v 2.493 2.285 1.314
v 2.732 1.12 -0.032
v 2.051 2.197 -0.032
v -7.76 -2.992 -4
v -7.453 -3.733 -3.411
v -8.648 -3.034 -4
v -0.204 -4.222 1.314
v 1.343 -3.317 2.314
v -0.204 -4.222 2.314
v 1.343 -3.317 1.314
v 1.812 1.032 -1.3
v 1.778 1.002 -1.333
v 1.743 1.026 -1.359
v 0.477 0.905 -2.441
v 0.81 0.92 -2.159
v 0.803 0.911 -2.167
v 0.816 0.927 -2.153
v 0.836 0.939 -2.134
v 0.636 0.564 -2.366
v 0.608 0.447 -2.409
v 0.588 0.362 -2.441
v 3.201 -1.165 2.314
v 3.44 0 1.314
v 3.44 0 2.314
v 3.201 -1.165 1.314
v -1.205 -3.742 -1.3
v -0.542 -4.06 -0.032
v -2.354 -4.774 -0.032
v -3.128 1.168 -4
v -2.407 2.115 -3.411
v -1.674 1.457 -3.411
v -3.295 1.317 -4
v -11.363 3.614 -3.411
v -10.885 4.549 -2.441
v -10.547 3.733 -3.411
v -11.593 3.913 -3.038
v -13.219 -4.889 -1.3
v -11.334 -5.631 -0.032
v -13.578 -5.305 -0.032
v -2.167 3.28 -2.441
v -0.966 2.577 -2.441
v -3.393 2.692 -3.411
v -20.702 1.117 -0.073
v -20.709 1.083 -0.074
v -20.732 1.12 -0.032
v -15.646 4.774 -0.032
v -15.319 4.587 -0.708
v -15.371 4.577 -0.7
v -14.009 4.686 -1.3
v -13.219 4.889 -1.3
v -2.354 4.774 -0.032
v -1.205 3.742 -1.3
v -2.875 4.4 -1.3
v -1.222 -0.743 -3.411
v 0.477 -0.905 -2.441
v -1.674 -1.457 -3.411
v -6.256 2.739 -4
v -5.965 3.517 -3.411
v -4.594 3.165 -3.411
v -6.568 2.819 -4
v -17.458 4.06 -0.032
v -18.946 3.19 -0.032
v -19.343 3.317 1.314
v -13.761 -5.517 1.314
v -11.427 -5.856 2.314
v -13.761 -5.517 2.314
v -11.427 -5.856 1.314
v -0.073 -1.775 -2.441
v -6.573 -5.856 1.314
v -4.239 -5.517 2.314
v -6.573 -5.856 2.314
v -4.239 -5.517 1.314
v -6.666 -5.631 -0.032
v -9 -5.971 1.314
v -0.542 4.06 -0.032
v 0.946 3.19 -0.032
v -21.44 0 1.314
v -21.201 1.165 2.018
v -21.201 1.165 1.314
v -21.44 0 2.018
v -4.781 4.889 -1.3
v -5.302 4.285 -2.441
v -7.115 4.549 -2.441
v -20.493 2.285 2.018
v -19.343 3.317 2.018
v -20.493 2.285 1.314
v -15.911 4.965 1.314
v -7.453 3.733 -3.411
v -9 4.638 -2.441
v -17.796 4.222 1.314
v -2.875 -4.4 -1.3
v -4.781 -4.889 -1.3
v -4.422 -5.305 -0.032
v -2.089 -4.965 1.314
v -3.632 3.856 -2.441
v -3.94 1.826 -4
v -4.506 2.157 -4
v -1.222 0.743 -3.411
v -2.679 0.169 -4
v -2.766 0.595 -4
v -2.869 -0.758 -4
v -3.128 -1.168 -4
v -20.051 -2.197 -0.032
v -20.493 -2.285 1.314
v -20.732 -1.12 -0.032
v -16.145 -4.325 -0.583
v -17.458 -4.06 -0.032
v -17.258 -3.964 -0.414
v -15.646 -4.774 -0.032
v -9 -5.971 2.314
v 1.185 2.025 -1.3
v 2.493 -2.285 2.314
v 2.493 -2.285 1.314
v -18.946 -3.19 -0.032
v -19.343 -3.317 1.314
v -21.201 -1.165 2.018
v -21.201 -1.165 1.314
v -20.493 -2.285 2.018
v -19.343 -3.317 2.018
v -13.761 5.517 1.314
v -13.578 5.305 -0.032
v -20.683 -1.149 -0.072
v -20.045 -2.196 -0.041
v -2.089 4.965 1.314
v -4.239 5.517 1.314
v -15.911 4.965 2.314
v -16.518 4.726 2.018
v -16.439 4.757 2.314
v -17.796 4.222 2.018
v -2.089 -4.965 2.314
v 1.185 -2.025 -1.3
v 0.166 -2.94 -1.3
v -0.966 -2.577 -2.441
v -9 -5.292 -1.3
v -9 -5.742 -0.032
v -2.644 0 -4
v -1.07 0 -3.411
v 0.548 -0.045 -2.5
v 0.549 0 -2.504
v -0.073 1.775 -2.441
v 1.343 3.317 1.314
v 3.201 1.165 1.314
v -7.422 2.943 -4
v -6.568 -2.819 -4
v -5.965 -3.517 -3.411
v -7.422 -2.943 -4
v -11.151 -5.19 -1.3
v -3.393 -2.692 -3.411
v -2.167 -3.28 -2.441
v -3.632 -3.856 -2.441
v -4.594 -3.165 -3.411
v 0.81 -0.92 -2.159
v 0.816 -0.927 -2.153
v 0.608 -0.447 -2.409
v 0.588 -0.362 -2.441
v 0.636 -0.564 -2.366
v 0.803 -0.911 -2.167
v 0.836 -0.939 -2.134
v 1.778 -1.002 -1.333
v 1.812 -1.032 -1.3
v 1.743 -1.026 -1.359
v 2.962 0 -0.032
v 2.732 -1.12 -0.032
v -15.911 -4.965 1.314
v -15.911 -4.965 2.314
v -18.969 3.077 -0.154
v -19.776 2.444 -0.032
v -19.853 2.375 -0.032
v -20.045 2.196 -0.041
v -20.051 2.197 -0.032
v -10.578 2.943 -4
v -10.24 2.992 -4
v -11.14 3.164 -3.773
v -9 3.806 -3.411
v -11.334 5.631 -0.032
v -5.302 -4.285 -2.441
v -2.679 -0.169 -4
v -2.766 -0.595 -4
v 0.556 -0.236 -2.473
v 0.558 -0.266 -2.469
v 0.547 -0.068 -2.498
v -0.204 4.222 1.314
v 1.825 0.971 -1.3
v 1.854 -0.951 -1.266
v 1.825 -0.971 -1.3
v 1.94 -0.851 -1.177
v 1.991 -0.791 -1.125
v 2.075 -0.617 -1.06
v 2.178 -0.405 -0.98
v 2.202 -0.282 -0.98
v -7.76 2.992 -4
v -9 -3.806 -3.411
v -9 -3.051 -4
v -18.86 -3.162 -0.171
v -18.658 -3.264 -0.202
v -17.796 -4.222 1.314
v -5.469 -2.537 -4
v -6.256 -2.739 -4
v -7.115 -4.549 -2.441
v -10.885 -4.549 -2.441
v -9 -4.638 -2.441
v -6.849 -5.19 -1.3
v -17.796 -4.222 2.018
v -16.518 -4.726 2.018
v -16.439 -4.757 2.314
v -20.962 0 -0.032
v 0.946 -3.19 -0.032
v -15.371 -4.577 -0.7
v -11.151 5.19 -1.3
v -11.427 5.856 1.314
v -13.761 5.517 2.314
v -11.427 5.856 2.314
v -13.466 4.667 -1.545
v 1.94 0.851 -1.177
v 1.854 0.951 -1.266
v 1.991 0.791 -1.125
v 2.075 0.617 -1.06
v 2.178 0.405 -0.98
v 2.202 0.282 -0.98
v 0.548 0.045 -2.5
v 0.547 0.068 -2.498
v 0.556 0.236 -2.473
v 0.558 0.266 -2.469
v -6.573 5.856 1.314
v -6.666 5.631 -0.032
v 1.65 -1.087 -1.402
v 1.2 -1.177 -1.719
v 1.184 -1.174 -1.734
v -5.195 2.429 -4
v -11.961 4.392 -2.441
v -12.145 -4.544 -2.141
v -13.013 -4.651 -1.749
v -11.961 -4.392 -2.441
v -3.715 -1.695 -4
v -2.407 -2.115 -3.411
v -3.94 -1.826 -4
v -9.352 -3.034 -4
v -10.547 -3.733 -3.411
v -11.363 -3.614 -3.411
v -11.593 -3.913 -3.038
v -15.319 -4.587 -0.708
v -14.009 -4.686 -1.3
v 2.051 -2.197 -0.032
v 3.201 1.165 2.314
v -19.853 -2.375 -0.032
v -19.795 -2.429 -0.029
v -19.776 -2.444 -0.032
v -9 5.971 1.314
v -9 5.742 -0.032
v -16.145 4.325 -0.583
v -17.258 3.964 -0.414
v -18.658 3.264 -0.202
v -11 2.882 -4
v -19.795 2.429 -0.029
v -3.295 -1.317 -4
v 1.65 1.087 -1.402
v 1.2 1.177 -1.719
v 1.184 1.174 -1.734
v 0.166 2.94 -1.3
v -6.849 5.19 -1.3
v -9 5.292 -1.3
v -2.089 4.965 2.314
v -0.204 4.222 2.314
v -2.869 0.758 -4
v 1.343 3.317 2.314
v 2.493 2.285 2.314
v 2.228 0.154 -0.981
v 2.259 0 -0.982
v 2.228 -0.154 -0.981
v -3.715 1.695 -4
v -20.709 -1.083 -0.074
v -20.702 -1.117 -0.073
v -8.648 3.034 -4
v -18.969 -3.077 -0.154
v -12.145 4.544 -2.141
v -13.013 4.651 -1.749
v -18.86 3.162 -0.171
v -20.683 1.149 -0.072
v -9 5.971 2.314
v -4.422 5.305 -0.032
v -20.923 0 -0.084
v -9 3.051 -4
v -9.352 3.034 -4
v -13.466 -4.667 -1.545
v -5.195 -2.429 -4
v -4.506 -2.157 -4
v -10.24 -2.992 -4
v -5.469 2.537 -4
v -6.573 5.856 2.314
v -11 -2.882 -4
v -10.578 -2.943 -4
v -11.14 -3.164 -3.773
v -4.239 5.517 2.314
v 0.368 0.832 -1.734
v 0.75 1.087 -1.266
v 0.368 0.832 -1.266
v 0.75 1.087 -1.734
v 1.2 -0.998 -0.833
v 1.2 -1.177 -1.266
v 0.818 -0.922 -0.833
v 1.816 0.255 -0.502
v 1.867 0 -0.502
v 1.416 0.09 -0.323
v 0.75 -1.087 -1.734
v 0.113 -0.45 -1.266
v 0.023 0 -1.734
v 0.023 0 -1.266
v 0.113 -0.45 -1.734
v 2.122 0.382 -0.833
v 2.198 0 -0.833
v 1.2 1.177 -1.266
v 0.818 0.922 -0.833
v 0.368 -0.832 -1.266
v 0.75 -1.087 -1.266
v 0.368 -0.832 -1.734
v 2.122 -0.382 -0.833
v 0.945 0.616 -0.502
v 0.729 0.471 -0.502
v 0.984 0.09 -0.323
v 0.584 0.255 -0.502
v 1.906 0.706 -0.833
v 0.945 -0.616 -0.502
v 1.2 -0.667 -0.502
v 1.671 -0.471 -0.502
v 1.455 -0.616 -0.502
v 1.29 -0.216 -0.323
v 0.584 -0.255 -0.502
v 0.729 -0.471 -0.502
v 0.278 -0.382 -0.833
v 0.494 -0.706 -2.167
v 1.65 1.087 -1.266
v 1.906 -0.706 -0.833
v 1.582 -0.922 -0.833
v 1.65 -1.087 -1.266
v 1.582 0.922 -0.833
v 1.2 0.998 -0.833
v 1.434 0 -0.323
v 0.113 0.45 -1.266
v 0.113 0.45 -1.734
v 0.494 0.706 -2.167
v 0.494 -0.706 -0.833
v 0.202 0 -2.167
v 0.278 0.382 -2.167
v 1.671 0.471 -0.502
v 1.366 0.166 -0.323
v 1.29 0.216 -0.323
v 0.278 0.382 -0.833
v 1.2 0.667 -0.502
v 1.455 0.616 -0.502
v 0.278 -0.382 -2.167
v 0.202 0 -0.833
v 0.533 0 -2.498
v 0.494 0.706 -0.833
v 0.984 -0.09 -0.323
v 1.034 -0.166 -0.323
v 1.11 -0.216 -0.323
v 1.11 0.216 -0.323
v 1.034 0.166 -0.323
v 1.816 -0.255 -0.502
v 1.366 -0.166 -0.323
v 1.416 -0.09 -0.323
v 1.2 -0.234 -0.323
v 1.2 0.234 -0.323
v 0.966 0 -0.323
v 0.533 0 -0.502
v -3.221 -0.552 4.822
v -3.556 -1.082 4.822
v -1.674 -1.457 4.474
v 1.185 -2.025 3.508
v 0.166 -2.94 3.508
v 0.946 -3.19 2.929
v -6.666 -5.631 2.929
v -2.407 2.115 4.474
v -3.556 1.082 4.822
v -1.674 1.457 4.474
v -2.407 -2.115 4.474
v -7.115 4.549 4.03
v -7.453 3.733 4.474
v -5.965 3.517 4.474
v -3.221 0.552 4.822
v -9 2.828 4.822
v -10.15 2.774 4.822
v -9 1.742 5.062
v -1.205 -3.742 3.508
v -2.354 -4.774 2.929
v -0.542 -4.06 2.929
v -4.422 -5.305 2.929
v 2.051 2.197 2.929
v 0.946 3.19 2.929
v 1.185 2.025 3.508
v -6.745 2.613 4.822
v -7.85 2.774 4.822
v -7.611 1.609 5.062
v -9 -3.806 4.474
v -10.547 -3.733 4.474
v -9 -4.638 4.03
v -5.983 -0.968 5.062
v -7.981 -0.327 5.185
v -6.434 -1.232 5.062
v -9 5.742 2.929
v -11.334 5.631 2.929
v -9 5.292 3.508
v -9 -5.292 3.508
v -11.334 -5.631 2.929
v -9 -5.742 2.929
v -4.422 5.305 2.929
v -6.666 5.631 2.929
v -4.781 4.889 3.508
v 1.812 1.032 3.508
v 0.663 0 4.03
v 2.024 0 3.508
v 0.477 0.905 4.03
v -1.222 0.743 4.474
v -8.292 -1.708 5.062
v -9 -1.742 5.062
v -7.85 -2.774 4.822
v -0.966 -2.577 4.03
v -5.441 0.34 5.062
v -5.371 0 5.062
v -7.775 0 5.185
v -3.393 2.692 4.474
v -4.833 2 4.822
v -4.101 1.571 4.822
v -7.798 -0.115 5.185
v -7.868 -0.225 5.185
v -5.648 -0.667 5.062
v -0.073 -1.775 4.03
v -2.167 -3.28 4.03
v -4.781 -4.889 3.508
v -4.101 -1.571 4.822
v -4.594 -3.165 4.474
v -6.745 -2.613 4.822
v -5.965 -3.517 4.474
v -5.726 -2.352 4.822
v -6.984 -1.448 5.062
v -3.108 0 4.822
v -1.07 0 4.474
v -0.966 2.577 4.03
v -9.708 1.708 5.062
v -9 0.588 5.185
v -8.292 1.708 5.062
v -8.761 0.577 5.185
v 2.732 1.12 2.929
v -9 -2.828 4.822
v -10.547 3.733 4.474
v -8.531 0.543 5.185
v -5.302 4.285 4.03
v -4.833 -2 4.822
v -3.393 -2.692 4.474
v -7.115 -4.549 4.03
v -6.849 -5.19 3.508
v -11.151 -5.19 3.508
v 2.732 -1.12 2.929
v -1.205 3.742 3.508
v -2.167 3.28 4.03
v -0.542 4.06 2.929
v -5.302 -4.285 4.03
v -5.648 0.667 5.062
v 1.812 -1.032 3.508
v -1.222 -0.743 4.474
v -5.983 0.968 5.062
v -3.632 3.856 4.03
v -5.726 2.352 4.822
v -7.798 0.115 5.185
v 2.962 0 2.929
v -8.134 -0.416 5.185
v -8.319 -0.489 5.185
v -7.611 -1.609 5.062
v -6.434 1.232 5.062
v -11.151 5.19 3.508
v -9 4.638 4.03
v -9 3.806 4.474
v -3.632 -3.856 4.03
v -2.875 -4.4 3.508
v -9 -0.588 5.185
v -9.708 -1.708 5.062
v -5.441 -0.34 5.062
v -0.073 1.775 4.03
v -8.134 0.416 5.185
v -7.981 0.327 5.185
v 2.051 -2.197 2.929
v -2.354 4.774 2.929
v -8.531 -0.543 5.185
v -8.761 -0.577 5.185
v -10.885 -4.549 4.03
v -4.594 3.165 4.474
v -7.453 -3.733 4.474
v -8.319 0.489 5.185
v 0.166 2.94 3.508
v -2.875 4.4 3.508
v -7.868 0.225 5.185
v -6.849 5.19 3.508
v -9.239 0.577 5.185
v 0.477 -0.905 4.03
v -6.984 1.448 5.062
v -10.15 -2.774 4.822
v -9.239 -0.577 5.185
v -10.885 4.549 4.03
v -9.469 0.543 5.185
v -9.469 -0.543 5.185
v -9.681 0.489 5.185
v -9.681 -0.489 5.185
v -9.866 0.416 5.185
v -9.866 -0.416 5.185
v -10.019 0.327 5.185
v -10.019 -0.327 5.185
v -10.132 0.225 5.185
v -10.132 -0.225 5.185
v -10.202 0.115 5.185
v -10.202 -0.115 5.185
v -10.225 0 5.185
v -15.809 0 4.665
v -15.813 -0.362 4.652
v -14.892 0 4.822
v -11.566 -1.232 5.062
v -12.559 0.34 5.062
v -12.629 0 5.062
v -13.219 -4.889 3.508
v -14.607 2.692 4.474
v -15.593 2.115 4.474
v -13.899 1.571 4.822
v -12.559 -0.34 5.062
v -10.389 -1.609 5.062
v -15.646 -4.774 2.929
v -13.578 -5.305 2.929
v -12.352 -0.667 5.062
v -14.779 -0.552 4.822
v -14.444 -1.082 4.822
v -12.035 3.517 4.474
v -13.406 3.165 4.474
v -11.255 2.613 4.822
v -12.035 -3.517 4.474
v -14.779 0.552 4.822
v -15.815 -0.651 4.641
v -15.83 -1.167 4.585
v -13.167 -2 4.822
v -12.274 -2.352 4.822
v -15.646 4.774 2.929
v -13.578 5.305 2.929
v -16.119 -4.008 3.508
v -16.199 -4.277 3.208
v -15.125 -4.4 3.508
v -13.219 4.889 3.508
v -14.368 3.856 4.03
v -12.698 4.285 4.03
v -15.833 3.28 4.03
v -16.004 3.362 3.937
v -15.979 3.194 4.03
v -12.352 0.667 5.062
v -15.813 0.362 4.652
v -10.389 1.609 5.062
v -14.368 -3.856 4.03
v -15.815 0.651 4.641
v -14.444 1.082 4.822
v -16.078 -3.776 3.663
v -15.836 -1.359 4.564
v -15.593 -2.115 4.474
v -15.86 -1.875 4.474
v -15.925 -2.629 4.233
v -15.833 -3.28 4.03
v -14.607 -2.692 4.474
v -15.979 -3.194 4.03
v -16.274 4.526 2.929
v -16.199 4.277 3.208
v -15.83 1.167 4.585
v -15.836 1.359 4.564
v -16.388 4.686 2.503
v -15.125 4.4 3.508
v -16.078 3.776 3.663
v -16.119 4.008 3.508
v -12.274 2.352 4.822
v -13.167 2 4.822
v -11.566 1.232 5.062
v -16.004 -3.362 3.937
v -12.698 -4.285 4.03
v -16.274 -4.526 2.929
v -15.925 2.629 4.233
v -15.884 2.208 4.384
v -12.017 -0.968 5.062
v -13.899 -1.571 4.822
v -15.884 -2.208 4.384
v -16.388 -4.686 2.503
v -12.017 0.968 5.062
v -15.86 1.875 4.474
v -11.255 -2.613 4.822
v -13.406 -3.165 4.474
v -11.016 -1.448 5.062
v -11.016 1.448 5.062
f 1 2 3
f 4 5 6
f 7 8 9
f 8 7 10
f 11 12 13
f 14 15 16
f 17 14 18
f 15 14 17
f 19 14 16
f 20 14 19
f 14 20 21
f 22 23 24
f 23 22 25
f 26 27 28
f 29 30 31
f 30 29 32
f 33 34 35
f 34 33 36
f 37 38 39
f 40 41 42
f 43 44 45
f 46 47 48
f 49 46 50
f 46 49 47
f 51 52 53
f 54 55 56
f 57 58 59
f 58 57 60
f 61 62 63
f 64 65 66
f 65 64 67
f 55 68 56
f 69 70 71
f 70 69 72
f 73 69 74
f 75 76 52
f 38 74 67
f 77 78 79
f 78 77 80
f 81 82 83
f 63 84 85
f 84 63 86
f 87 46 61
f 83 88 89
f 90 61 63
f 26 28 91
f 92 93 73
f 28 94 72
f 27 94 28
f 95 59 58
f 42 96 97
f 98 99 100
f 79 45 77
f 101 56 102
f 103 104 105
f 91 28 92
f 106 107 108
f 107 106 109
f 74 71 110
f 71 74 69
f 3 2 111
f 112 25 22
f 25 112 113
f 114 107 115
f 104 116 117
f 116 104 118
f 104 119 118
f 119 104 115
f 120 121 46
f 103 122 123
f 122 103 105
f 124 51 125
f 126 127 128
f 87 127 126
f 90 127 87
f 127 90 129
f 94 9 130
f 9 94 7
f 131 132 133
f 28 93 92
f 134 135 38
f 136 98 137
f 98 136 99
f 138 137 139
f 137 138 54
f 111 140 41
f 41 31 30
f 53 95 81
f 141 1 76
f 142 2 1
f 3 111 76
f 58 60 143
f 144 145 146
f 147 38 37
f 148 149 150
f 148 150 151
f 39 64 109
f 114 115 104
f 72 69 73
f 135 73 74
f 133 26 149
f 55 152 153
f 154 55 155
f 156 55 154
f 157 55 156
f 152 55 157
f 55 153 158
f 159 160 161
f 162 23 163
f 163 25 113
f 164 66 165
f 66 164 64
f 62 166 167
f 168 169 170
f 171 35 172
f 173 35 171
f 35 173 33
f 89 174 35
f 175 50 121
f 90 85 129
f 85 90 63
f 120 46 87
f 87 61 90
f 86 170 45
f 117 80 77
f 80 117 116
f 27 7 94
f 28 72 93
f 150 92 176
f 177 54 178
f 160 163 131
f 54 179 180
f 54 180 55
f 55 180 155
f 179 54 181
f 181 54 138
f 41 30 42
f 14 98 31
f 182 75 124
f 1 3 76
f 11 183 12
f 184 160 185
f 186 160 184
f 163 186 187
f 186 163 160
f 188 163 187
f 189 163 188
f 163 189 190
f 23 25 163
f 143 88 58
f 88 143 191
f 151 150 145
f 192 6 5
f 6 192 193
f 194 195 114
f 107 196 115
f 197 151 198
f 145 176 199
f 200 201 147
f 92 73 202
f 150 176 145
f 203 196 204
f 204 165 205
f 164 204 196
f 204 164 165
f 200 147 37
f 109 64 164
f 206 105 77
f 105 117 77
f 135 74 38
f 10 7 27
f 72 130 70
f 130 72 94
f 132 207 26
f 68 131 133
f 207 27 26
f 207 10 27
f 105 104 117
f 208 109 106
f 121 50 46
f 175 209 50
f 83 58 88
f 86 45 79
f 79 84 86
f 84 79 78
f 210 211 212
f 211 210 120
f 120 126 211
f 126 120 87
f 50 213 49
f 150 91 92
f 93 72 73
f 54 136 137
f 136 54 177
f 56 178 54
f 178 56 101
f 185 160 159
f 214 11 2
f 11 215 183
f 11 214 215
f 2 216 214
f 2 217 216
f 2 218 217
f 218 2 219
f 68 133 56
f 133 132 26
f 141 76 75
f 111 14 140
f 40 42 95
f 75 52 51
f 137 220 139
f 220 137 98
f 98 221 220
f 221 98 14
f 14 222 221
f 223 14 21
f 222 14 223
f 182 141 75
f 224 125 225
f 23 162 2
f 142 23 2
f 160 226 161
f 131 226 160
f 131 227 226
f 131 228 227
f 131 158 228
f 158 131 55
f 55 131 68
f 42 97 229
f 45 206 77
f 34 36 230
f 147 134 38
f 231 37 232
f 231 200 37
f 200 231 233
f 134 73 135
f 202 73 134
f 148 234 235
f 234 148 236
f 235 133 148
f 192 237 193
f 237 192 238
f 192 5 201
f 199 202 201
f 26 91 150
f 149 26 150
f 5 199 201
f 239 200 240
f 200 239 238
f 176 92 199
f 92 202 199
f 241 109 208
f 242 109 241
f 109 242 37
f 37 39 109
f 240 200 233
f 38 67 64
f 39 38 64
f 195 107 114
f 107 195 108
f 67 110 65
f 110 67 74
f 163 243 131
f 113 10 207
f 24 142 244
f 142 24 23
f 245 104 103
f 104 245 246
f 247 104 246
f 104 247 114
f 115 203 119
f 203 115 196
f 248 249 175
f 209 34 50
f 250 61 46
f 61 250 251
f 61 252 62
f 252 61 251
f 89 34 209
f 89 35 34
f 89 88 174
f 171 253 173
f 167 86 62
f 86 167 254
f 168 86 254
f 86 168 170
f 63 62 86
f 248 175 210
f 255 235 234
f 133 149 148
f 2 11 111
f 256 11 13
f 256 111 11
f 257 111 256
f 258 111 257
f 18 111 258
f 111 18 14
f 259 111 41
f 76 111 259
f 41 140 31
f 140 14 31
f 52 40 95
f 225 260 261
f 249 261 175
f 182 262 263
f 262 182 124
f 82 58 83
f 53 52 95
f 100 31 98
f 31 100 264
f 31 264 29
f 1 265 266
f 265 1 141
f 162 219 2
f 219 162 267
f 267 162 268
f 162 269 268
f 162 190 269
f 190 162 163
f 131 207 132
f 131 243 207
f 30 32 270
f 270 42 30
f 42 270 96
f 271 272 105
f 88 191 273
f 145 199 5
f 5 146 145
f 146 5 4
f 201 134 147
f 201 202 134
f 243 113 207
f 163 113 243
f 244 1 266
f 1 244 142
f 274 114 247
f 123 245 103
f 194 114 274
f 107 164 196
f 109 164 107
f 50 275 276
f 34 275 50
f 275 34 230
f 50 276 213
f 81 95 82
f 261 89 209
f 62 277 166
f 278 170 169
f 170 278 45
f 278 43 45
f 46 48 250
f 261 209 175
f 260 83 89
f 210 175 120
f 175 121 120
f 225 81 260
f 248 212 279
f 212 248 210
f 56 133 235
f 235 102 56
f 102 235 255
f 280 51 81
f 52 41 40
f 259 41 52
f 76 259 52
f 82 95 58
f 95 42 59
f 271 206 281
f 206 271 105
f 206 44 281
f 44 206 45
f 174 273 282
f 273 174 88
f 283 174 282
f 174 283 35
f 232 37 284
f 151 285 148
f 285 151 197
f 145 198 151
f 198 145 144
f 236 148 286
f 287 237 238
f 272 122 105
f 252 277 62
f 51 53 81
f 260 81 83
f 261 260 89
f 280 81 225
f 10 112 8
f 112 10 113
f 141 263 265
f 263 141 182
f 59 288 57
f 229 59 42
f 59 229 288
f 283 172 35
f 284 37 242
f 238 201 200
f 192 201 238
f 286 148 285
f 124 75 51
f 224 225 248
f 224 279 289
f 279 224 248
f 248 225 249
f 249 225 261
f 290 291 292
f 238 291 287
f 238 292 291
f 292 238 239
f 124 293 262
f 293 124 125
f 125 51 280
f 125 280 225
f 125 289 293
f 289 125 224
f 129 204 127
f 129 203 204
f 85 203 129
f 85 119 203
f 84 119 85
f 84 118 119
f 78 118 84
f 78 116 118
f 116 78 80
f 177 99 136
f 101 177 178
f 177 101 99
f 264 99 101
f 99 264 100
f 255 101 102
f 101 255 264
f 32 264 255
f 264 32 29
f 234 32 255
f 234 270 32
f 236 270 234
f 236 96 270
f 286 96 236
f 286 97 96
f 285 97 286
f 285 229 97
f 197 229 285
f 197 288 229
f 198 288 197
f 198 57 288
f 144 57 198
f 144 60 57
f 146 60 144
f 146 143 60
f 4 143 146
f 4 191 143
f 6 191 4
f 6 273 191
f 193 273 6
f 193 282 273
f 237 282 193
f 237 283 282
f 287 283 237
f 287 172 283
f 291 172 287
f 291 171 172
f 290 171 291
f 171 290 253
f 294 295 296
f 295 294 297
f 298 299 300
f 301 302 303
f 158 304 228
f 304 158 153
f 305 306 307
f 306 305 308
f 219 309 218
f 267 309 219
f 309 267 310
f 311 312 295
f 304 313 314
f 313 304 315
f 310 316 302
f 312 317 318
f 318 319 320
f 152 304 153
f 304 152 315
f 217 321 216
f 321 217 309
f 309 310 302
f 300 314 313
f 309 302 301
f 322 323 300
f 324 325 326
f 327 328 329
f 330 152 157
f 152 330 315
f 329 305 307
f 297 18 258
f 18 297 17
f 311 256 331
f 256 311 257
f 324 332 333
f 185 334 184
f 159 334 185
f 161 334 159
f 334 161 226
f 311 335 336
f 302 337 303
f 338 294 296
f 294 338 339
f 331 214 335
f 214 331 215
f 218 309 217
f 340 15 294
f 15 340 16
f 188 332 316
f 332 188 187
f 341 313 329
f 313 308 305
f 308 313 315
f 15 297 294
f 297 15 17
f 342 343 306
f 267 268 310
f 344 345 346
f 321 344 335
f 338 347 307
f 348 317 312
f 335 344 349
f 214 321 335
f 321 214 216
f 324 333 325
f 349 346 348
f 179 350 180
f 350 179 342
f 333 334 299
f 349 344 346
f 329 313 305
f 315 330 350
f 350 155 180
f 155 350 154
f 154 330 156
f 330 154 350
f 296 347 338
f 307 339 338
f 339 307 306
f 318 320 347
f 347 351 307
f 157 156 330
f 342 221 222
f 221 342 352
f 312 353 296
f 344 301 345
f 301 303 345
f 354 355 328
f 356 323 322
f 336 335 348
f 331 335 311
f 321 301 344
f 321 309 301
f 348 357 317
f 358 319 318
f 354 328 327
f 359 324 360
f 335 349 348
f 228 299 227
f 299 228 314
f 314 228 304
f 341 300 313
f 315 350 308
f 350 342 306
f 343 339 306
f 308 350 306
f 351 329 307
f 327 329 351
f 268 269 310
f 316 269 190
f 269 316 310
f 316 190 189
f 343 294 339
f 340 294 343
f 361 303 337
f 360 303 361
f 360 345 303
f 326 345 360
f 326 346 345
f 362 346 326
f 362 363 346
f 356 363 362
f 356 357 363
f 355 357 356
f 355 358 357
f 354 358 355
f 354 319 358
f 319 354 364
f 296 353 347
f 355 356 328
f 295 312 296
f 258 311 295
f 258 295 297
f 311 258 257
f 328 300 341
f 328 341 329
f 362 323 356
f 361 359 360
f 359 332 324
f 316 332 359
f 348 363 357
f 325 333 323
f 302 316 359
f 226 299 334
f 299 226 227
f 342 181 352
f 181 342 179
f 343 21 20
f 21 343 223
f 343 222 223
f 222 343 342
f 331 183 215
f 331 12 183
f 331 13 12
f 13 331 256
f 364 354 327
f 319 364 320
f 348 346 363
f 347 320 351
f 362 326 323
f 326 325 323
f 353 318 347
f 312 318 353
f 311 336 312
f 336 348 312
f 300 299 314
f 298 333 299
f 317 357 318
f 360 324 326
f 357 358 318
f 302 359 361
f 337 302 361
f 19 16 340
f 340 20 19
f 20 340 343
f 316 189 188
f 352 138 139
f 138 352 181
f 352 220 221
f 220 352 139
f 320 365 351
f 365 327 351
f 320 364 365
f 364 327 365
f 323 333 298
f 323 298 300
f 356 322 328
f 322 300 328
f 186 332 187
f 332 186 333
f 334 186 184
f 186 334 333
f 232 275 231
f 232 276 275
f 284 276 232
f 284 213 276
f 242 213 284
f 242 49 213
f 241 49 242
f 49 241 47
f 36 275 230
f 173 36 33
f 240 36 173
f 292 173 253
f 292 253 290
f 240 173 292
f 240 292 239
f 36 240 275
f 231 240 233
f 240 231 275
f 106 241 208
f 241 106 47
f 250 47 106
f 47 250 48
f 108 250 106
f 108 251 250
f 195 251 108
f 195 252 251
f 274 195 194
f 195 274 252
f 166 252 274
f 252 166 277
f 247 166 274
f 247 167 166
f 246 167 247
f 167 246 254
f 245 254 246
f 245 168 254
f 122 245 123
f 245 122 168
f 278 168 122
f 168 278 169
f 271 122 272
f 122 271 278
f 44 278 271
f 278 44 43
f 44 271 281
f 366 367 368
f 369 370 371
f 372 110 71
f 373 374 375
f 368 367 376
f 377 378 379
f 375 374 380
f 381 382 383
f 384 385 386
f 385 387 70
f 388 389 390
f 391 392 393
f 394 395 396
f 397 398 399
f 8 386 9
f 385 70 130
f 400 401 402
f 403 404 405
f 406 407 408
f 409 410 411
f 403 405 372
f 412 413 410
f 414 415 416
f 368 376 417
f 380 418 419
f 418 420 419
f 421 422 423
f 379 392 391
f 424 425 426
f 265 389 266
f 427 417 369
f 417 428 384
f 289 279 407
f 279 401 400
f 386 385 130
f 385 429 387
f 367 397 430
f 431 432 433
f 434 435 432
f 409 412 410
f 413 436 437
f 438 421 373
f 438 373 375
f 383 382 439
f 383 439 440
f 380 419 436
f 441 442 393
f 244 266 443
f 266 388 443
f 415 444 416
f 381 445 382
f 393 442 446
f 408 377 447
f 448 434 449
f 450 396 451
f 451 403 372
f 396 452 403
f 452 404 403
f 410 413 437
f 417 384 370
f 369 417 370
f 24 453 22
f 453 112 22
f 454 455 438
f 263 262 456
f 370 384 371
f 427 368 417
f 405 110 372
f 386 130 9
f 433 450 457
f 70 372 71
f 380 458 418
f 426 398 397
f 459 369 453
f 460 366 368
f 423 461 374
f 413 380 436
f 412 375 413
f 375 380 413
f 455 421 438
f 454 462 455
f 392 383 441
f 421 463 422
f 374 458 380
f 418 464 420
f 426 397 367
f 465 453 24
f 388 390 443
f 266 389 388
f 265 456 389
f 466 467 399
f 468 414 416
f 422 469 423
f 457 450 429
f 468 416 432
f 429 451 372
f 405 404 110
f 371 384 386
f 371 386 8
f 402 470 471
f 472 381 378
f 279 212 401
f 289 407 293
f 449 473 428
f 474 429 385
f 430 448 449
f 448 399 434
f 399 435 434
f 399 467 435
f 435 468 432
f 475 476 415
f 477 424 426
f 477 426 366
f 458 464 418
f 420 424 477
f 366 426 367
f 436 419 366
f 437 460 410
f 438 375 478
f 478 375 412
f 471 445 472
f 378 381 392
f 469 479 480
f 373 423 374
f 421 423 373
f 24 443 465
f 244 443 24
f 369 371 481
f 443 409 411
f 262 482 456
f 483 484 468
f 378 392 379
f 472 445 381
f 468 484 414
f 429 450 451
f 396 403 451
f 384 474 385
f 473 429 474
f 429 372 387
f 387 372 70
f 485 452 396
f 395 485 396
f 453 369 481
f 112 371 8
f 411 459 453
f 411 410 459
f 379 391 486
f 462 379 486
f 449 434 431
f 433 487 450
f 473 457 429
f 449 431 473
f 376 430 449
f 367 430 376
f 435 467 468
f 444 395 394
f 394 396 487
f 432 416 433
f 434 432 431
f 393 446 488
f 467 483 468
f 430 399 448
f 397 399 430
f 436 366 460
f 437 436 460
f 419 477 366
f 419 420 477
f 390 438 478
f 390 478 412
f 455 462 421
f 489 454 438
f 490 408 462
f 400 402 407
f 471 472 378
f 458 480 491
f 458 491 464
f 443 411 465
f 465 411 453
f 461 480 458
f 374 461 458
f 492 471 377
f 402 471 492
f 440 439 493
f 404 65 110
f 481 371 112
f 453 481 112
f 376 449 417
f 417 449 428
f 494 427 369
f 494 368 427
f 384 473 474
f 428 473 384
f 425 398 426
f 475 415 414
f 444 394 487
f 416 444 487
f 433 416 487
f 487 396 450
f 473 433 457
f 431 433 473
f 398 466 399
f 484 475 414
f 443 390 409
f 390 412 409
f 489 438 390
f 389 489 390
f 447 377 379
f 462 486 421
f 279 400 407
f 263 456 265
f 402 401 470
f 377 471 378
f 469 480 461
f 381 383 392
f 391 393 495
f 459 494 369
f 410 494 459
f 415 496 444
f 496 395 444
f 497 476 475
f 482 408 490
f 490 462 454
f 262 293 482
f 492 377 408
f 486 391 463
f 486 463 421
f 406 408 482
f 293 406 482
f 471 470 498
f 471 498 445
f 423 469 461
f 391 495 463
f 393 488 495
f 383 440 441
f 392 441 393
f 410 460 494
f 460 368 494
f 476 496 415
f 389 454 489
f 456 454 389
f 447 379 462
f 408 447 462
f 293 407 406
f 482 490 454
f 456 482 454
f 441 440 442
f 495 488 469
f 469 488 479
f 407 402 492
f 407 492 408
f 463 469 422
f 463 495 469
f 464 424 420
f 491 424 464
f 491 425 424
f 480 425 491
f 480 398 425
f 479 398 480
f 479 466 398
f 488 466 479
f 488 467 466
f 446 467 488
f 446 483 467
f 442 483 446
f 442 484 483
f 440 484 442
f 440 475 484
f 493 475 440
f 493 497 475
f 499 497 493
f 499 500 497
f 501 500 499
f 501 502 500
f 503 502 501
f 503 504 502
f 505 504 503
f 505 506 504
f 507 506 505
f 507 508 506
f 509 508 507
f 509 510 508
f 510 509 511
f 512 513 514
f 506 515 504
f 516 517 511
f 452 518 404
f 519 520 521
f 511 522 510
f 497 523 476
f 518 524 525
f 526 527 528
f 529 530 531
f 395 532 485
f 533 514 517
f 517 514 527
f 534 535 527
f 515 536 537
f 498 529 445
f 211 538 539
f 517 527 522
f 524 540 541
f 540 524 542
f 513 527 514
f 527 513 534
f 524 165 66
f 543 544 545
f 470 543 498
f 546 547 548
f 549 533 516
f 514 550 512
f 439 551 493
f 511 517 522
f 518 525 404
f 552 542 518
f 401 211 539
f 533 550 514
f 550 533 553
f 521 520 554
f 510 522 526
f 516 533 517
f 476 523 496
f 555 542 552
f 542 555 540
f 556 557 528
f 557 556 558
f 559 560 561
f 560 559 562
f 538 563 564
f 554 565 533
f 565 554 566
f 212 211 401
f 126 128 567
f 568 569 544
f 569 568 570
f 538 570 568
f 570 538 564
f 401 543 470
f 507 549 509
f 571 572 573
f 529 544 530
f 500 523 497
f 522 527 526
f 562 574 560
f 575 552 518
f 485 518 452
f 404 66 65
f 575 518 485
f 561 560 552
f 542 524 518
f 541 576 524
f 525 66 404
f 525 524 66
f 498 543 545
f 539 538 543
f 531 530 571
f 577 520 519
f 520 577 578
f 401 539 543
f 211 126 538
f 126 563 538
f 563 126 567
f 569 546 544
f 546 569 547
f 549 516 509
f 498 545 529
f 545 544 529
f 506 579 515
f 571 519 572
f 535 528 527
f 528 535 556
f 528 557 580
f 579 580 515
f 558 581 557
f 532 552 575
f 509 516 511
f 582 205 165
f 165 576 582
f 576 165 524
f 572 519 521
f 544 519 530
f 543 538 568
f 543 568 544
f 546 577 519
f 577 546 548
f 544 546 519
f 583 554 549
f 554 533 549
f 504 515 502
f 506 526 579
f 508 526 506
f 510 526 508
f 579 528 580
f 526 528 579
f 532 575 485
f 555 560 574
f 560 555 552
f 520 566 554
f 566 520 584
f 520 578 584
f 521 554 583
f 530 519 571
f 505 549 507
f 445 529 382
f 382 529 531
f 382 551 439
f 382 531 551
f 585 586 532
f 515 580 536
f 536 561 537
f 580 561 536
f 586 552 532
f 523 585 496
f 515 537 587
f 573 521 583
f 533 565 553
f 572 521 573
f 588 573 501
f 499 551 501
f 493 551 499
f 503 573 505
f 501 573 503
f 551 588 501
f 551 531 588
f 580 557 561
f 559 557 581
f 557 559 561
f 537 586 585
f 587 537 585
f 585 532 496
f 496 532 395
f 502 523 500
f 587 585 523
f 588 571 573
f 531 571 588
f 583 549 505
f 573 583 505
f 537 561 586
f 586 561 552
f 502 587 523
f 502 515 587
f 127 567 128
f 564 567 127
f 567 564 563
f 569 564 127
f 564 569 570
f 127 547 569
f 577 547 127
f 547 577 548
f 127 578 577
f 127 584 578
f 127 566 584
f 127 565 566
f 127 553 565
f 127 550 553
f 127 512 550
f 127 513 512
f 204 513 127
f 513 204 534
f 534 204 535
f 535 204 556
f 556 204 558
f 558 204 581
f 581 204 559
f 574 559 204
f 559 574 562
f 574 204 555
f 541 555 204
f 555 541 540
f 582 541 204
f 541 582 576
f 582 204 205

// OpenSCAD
// file: ../lib/util.scad
fn1 = 32;
fn2 = 16;

module util_half_sphere(radius, fn=fn1) {
    difference() {
        sphere(radius, $fn=fn);
        translate([0,0,-(radius+radius/19)])
            cube(2*radius+radius/10, center=true);
    }
}

function gcd(a,b) = a == b ? a : a > b ? gcd(a-b, b) : gcd(a, b-a);

module util_saucer(length, width, height, fn=fn1) {
    rad = gcd(length,gcd(width,height));
    //rad = 10;
    scale([length/(2*rad), width/(2*rad), height/rad])
        util_half_sphere(rad, fn);
}

module util_half_cylinder(length, radius, inner_fn=fn2, outer_fn=fn1) {
    maxval = max(length, 2*radius);
    intersection() {
        difference() {
            rotate([0,90,0])
                translate([0,0,-(length/2 + length/20)])
                    cylinder(length+length/10, radius, radius, $fn=inner_fn);
            
            translate([0,0,(maxval/2 + maxval/19)])
                cube(maxval+maxval/10, center=true);
        }
        
        translate([0,0,-(radius+radius/20)])
            cylinder(radius + radius/10, length/2, length/2, $fn=outer_fn);
    }
}

module util_body(length, width, height, upper_height, fn=fn1) {
    rad = gcd(length, gcd(width, upper_height));
    
    scale(.995) scale([length/(2*rad), width/(2*rad), 1])
        util_half_cylinder(2*rad, height, outer_fn=fn);
}

module util_graded_cylinder(height, radius_start, radius_end, grades=1, fn=fn1) {
    height_grade = height / grades;
    radius_grade = (radius_start - radius_end) / (grades * grades);
    for (i = [0 : 1 : grades]) {
        translate([0,0,i*height_grade])
            cylinder(height_grade, 
                     radius_start - i*radius_grade * i,
                     radius_start - (i+1) * radius_grade * (i+1),
                     $fn = fn);
    }
}

module util_nacelle(length, width, height, curved=false, up=true, front_bulge=false) {
    rad = min(width, height/2);
    grads = curved ? 6 : 1;
    scale_factor = front_bulge ? 1.1 : 1;
    direction = up ? -1 : 1;
    difference() {
        scale([1, width/ (2*rad), height/rad])
            difference() {
                union() {
                    rotate([0,-90,0])
                        rotate(30)
                            util_graded_cylinder(length-rad, rad, rad/2, grads, 6);
                    scale(scale_factor) 
                        rotate([0,90,0]) rotate(90) sphere(rad, $fn=6);
                }
                
                translate([-length/2, 0, direction * (height/2 + height/19)])
                    cube([length+length, width+width, height+height/10], center=true);
            }
        
        translate([-length-(curved?length/3:0), 0, -length/3])
            rotate([0,-45,0])
                cube(length, center=true);
    }
}

module util_mirrored(v) {
    children();
    mirror(v) children();
}

module util_ring(outer, inner, height) {
    difference() {
        translate([0,0,-height/2])
            cylinder(height, outer, outer);
        translate([0,0,-(height/2 + height/19)])
            cylinder(height+height/10, inner, inner);
    }
}

module util_star(radius, thick, num, half=false) {
    angle = 360/num;
    offset = half? angle/2 : 0;
    for (i = [0: 1: num]) {
        rotate(i* angle + offset)
            translate([radius/2,0,0])
                cube([radius, thick, thick], center=true);
    }
}

module util_ring_star(radius, thick, num, inner, half=false) {
    outer=inner+thick;
    avg = (inner + outer)/2;
    union() {
        difference() {
            util_star(radius, thick, num, half);
            cylinder(2*thick, outer, outer, $fn=num, center=true);
        }
        util_ring(outer, inner, thick);
    }
}

module util_hangar_disk(height, lower, upper, num, fn=fn1) {
    difference() {
            cylinder(height, lower, upper, $fn=fn, center=true);
        difference() {
            scale([1,1,22])
                util_star(1.1*upper, height/20, num, half=true);
            scale(.95)
                cylinder(height, lower, upper, $fn=fn, center=true);
        }
    }
}

module util_hangar_form(length, width, height, num, inner=0) {
    l = 0.6* max(length, width);
    h = 2.5* height;
    thick = min(height/20,1);
    inner = inner == 0 ? l/3 : inner;
    difference() {
        children();
        scale([1,1,h/thick]) 
            util_ring_star(l, thick, num, inner, half=true);
    }
    scale(.95) children();
}

module util_nacelle_bar(span, height, width, thickness) {
    rad = (span*span/(8*height) + height/2);
    outer = rad + thickness/2;
    inner = rad - thickness/2;
    difference(){
        translate([0,0,outer])
            rotate([0,90,0])
                util_ring(outer, inner, width);
    
        translate([0,0,1.1*outer+height])
            cube(2.2*outer, center=true);
    }
}

module util_q_sphere(rad, quadrant, faces) {
    x_sign = quadrant == 1 ? 1 :
             quadrant == 2 ? -1 :
             quadrant == 3 ? -1 :
             quadrant == 4 ? 1 : 0;
    z_sign = quadrant == 1 ? 1 :
             quadrant == 2 ? 1 :
             quadrant == 3 ? -1 :
             quadrant == 4 ? -1 : 0;
    
    difference() {
        sphere(rad, $fn=faces);

        translate([x_sign*(-1.1*rad - .01),0,0])
        cube(2.2*rad, center=true);

        translate([0,0,z_sign*(-1.1*rad - .01)])
        cube(2.2*rad, center=true);
    }
}

module util_ovoid(front_rad, back_rad, width, upper_rad, lower_rad, faces=32) {
    half_width = width/2;
    largest=max(front_rad, back_rad, half_width, upper_rad, lower_rad);
    smallest=min(front_rad, back_rad, half_width, upper_rad, lower_rad);
    
    union() {
        scale([front_rad/smallest, half_width/smallest, upper_rad/smallest])
        util_q_sphere(smallest, 1, faces);
        
        scale([front_rad/smallest, half_width/smallest, lower_rad/smallest])
        util_q_sphere(smallest, 4, faces);
        
        scale([back_rad/smallest, half_width/smallest, lower_rad/smallest])
        util_q_sphere(smallest, 3, faces);
        
        scale([back_rad/smallest, half_width/smallest, upper_rad/smallest])
        util_q_sphere(smallest, 2, faces);
    }
}
// main file
use <../lib/util.scad>;

module dip_saucer() {
    difference() {
        util_saucer(27,27,5);
        //dip_body();
        translate([13.5,0,2]) 
            rotate([0,-15,0])
            cube(5, center=true);
    }
    
}

module dip_body() {
    difference() {
        translate([-9,0,2])
            mirror([0,0,1])
                util_saucer(25,12,7);
        
        union() {
            translate([-9,0,-13])
                cube(18, center=true);
            
            translate([1.2,0,-1.5])
                sphere(1.2, $fn=16);
            
            translate([-21,0,-4])
                scale([2.5,1,1])
                rotate([90,0,0])
                    cylinder(12,4,4, center=true);
        }
    }
    
    difference() {
        translate([-9,0,2])
        util_ovoid(12.5,12.5,12,3.2,1);
        
        translate([-30,0,0])
        rotate([0,15,0])
        cube(25,center=true);
    }
}

dip_body();

module dip_body2() {
    intersection() {
        dip_body();
        util_mirrored([0,0,1]) dip_saucer();
    }
}

module dip_nacelle_assembly() {
    translate([-19,0,0.5])
        util_nacelle_bar(24,5,3,.5);

    
    util_mirrored([0,1,0])
        translate([-15,11,4])
            util_nacelle(18,5,3,curved=true);
}
